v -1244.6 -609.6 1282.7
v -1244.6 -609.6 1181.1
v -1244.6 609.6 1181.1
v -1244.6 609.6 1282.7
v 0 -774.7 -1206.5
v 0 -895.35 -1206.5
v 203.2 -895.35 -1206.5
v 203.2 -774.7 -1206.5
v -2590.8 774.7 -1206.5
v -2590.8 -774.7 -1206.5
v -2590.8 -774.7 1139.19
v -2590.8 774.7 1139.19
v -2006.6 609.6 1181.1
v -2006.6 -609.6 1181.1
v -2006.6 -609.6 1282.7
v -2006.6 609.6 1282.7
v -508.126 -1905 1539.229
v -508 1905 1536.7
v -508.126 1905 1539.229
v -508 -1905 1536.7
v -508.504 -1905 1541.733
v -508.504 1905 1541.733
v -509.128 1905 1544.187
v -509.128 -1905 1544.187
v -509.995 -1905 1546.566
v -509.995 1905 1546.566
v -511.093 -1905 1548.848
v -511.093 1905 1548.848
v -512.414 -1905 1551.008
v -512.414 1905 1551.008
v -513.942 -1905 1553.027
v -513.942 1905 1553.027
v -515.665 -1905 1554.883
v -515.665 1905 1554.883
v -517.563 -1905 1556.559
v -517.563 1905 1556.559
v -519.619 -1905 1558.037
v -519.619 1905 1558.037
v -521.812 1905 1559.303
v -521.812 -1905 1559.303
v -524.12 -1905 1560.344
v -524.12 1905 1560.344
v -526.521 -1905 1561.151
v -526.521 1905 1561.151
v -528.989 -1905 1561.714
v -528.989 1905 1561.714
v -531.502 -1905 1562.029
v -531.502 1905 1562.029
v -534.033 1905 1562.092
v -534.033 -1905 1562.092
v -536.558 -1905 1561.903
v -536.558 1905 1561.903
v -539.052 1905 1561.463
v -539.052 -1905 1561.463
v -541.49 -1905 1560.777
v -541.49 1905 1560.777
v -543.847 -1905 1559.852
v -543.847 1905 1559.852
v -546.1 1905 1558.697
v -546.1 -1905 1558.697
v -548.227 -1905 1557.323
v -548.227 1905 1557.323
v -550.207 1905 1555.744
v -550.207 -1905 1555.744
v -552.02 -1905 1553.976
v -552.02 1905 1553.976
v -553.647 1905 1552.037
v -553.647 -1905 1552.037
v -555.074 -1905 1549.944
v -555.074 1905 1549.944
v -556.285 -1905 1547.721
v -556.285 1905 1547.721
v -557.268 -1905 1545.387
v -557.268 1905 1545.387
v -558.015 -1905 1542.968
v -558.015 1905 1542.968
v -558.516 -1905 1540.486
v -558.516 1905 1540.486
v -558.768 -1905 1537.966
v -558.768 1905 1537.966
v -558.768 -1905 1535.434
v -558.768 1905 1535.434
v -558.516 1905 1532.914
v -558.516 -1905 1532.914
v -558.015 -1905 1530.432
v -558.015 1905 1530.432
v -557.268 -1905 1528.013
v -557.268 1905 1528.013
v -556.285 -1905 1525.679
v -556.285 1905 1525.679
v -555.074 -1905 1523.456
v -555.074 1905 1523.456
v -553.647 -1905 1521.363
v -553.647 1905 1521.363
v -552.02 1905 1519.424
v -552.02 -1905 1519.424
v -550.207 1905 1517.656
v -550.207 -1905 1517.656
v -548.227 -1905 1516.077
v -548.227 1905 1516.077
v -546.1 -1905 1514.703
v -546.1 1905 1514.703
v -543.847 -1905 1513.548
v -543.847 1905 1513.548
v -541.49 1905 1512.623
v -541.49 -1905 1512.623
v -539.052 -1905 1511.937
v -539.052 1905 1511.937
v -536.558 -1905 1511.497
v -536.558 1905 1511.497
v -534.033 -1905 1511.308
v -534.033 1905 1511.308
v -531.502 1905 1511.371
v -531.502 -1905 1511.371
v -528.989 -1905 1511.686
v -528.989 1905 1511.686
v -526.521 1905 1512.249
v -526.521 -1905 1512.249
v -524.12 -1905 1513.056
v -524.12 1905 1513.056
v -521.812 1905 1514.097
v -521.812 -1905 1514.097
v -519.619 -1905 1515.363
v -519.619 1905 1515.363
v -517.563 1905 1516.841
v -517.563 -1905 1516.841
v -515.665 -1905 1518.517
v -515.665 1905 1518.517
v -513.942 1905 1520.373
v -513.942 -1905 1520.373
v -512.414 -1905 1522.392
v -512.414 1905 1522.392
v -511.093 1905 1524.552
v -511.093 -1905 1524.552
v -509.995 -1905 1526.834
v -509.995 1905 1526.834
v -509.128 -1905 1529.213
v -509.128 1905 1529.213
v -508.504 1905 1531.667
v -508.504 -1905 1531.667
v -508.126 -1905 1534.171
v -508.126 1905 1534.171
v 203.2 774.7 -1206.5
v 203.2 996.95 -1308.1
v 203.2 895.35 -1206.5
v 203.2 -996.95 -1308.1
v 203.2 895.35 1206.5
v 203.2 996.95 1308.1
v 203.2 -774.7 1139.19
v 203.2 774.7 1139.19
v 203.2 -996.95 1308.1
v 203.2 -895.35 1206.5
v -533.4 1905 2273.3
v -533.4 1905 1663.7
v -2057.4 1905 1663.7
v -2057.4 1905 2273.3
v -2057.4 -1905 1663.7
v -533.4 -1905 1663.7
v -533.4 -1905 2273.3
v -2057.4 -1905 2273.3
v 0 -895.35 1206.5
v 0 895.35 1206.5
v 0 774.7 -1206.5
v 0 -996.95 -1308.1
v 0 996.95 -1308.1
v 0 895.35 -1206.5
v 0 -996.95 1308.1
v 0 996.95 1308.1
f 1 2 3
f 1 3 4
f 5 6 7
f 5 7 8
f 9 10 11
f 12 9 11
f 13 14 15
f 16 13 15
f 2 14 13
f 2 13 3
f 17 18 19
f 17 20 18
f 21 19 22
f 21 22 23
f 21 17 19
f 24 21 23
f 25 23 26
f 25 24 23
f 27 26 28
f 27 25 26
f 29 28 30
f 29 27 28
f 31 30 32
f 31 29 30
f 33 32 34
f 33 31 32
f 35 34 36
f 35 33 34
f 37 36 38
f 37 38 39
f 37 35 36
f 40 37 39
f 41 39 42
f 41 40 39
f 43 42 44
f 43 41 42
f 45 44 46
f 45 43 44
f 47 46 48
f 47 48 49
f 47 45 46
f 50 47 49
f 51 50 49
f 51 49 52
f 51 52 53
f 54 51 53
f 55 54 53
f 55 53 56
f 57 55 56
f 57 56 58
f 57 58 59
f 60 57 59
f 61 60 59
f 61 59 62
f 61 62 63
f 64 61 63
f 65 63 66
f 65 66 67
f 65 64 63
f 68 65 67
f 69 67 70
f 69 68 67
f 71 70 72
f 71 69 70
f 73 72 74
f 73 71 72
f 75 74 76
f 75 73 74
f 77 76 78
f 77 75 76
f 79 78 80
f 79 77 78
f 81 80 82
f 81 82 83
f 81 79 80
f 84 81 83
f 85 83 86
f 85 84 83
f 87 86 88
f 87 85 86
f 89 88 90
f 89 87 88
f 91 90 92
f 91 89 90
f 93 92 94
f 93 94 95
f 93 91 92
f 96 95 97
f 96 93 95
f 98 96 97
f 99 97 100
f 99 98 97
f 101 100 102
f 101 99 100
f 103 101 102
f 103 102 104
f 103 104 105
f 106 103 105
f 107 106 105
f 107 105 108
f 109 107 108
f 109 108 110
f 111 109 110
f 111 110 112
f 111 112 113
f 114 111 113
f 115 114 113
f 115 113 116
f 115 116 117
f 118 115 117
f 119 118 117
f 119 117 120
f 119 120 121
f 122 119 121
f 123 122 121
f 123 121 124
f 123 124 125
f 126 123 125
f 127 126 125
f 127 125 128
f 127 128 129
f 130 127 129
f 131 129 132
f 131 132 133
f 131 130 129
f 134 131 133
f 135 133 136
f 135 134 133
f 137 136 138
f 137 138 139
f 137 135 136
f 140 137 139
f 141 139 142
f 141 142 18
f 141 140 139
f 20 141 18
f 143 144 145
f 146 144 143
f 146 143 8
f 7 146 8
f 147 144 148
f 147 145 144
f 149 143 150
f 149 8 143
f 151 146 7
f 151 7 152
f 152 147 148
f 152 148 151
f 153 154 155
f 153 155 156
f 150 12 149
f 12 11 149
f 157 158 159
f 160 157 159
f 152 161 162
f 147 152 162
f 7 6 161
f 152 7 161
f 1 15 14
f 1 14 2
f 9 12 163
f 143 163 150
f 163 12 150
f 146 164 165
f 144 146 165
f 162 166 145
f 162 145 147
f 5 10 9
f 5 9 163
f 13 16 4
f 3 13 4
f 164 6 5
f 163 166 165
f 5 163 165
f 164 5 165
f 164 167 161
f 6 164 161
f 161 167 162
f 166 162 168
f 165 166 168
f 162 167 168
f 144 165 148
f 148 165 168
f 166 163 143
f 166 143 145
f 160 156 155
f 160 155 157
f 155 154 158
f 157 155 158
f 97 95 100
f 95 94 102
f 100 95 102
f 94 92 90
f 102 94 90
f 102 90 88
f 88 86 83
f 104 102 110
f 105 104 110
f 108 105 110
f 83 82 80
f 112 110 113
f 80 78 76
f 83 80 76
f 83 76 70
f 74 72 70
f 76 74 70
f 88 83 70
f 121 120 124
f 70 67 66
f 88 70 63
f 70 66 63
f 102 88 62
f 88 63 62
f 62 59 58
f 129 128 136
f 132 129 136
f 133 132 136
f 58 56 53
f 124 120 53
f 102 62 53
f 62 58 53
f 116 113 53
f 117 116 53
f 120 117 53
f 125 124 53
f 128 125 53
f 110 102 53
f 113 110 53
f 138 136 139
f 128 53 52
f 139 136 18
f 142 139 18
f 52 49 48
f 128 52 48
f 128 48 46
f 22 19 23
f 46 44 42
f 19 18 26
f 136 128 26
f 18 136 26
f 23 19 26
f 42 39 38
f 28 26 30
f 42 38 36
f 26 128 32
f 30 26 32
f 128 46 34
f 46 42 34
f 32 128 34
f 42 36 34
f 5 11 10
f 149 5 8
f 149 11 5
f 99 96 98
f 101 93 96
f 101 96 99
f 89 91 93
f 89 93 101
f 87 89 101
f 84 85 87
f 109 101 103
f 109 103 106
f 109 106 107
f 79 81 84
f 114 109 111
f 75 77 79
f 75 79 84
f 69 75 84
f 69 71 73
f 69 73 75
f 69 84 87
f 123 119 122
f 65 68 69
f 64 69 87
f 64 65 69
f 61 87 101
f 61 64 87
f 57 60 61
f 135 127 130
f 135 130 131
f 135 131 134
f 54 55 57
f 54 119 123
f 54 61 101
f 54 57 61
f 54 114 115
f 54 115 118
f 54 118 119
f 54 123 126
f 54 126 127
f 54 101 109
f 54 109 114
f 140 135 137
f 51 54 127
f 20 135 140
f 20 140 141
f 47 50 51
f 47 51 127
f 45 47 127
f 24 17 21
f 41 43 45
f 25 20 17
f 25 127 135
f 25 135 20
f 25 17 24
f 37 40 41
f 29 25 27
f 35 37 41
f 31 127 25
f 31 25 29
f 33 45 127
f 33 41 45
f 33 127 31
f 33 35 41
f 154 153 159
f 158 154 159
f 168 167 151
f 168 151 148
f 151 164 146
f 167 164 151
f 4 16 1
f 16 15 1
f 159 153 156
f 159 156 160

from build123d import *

# Parameters (mm, degrees)
F0_W           = 1993.9
F0_H           = 2616.2
F0_W_2         = 1790.7
F0_H_2         = 2413
F1_DEPTH       = 203.2
F3_W           = 3810
F3_H           = 609.6
F4_DEPTH       = 1524
F5_R           = 25.4
F6_DEPTH       = 1905
F6_DEPTH_BACK  = 1905
F7_W           = 762
F7_H           = 101.6
F8_DEPTH       = 609.6
F8_DEPTH_BACK  = 609.6
F9_W           = 2794
F9_H           = 2345.69
F10_DEPTH      = 774.7
F10_DEPTH_BACK = 774.7


with BuildPart() as f1:
    # F0 (on Right) → F1 (new body)
    with BuildSketch(Plane.YZ):
        Rectangle(F0_W, F0_H)
        Rectangle(F0_W_2, F0_H_2, mode=Mode.SUBTRACT)
    extrude(amount=F1_DEPTH)

    # F9 (on Front) → F10 (join, two sides)
    with BuildSketch(Plane.XZ) as f10_sk:
        with Locations((-1193.8, -33.655)):
            Rectangle(F9_W, F9_H)
    extrude(amount=F10_DEPTH)
    extrude(f10_sk.sketch, amount=-F10_DEPTH_BACK)


with BuildPart() as f4:
    # F3 (on offset) → F4 (new body)
    with BuildSketch(Plane(origin=(-533.4, 0, 0), x_dir=(0, -1, 0), z_dir=(-1, 0, 0))):
        with Locations((0, 1968.5)):
            Rectangle(F3_W, F3_H)
    extrude(amount=F4_DEPTH)


with BuildPart() as f6:
    # F5 (on Front) → F6 (new body, two sides)
    with BuildSketch(Plane.XZ) as f6_sk:
        with Locations((-533.4, 1536.7)):
            Circle(F5_R)
    extrude(amount=F6_DEPTH)
    extrude(f6_sk.sketch, amount=-F6_DEPTH_BACK)


with BuildPart() as f8:
    # F7 (on Front) → F8 (new body, two sides)
    with BuildSketch(Plane.XZ) as f8_sk:
        with Locations((-1625.6, 1231.9)):
            Rectangle(F7_W, F7_H)
    extrude(amount=F8_DEPTH)
    extrude(f8_sk.sketch, amount=-F8_DEPTH_BACK)


solid = Compound([f1.part, f4.part, f6.part, f8.part])
